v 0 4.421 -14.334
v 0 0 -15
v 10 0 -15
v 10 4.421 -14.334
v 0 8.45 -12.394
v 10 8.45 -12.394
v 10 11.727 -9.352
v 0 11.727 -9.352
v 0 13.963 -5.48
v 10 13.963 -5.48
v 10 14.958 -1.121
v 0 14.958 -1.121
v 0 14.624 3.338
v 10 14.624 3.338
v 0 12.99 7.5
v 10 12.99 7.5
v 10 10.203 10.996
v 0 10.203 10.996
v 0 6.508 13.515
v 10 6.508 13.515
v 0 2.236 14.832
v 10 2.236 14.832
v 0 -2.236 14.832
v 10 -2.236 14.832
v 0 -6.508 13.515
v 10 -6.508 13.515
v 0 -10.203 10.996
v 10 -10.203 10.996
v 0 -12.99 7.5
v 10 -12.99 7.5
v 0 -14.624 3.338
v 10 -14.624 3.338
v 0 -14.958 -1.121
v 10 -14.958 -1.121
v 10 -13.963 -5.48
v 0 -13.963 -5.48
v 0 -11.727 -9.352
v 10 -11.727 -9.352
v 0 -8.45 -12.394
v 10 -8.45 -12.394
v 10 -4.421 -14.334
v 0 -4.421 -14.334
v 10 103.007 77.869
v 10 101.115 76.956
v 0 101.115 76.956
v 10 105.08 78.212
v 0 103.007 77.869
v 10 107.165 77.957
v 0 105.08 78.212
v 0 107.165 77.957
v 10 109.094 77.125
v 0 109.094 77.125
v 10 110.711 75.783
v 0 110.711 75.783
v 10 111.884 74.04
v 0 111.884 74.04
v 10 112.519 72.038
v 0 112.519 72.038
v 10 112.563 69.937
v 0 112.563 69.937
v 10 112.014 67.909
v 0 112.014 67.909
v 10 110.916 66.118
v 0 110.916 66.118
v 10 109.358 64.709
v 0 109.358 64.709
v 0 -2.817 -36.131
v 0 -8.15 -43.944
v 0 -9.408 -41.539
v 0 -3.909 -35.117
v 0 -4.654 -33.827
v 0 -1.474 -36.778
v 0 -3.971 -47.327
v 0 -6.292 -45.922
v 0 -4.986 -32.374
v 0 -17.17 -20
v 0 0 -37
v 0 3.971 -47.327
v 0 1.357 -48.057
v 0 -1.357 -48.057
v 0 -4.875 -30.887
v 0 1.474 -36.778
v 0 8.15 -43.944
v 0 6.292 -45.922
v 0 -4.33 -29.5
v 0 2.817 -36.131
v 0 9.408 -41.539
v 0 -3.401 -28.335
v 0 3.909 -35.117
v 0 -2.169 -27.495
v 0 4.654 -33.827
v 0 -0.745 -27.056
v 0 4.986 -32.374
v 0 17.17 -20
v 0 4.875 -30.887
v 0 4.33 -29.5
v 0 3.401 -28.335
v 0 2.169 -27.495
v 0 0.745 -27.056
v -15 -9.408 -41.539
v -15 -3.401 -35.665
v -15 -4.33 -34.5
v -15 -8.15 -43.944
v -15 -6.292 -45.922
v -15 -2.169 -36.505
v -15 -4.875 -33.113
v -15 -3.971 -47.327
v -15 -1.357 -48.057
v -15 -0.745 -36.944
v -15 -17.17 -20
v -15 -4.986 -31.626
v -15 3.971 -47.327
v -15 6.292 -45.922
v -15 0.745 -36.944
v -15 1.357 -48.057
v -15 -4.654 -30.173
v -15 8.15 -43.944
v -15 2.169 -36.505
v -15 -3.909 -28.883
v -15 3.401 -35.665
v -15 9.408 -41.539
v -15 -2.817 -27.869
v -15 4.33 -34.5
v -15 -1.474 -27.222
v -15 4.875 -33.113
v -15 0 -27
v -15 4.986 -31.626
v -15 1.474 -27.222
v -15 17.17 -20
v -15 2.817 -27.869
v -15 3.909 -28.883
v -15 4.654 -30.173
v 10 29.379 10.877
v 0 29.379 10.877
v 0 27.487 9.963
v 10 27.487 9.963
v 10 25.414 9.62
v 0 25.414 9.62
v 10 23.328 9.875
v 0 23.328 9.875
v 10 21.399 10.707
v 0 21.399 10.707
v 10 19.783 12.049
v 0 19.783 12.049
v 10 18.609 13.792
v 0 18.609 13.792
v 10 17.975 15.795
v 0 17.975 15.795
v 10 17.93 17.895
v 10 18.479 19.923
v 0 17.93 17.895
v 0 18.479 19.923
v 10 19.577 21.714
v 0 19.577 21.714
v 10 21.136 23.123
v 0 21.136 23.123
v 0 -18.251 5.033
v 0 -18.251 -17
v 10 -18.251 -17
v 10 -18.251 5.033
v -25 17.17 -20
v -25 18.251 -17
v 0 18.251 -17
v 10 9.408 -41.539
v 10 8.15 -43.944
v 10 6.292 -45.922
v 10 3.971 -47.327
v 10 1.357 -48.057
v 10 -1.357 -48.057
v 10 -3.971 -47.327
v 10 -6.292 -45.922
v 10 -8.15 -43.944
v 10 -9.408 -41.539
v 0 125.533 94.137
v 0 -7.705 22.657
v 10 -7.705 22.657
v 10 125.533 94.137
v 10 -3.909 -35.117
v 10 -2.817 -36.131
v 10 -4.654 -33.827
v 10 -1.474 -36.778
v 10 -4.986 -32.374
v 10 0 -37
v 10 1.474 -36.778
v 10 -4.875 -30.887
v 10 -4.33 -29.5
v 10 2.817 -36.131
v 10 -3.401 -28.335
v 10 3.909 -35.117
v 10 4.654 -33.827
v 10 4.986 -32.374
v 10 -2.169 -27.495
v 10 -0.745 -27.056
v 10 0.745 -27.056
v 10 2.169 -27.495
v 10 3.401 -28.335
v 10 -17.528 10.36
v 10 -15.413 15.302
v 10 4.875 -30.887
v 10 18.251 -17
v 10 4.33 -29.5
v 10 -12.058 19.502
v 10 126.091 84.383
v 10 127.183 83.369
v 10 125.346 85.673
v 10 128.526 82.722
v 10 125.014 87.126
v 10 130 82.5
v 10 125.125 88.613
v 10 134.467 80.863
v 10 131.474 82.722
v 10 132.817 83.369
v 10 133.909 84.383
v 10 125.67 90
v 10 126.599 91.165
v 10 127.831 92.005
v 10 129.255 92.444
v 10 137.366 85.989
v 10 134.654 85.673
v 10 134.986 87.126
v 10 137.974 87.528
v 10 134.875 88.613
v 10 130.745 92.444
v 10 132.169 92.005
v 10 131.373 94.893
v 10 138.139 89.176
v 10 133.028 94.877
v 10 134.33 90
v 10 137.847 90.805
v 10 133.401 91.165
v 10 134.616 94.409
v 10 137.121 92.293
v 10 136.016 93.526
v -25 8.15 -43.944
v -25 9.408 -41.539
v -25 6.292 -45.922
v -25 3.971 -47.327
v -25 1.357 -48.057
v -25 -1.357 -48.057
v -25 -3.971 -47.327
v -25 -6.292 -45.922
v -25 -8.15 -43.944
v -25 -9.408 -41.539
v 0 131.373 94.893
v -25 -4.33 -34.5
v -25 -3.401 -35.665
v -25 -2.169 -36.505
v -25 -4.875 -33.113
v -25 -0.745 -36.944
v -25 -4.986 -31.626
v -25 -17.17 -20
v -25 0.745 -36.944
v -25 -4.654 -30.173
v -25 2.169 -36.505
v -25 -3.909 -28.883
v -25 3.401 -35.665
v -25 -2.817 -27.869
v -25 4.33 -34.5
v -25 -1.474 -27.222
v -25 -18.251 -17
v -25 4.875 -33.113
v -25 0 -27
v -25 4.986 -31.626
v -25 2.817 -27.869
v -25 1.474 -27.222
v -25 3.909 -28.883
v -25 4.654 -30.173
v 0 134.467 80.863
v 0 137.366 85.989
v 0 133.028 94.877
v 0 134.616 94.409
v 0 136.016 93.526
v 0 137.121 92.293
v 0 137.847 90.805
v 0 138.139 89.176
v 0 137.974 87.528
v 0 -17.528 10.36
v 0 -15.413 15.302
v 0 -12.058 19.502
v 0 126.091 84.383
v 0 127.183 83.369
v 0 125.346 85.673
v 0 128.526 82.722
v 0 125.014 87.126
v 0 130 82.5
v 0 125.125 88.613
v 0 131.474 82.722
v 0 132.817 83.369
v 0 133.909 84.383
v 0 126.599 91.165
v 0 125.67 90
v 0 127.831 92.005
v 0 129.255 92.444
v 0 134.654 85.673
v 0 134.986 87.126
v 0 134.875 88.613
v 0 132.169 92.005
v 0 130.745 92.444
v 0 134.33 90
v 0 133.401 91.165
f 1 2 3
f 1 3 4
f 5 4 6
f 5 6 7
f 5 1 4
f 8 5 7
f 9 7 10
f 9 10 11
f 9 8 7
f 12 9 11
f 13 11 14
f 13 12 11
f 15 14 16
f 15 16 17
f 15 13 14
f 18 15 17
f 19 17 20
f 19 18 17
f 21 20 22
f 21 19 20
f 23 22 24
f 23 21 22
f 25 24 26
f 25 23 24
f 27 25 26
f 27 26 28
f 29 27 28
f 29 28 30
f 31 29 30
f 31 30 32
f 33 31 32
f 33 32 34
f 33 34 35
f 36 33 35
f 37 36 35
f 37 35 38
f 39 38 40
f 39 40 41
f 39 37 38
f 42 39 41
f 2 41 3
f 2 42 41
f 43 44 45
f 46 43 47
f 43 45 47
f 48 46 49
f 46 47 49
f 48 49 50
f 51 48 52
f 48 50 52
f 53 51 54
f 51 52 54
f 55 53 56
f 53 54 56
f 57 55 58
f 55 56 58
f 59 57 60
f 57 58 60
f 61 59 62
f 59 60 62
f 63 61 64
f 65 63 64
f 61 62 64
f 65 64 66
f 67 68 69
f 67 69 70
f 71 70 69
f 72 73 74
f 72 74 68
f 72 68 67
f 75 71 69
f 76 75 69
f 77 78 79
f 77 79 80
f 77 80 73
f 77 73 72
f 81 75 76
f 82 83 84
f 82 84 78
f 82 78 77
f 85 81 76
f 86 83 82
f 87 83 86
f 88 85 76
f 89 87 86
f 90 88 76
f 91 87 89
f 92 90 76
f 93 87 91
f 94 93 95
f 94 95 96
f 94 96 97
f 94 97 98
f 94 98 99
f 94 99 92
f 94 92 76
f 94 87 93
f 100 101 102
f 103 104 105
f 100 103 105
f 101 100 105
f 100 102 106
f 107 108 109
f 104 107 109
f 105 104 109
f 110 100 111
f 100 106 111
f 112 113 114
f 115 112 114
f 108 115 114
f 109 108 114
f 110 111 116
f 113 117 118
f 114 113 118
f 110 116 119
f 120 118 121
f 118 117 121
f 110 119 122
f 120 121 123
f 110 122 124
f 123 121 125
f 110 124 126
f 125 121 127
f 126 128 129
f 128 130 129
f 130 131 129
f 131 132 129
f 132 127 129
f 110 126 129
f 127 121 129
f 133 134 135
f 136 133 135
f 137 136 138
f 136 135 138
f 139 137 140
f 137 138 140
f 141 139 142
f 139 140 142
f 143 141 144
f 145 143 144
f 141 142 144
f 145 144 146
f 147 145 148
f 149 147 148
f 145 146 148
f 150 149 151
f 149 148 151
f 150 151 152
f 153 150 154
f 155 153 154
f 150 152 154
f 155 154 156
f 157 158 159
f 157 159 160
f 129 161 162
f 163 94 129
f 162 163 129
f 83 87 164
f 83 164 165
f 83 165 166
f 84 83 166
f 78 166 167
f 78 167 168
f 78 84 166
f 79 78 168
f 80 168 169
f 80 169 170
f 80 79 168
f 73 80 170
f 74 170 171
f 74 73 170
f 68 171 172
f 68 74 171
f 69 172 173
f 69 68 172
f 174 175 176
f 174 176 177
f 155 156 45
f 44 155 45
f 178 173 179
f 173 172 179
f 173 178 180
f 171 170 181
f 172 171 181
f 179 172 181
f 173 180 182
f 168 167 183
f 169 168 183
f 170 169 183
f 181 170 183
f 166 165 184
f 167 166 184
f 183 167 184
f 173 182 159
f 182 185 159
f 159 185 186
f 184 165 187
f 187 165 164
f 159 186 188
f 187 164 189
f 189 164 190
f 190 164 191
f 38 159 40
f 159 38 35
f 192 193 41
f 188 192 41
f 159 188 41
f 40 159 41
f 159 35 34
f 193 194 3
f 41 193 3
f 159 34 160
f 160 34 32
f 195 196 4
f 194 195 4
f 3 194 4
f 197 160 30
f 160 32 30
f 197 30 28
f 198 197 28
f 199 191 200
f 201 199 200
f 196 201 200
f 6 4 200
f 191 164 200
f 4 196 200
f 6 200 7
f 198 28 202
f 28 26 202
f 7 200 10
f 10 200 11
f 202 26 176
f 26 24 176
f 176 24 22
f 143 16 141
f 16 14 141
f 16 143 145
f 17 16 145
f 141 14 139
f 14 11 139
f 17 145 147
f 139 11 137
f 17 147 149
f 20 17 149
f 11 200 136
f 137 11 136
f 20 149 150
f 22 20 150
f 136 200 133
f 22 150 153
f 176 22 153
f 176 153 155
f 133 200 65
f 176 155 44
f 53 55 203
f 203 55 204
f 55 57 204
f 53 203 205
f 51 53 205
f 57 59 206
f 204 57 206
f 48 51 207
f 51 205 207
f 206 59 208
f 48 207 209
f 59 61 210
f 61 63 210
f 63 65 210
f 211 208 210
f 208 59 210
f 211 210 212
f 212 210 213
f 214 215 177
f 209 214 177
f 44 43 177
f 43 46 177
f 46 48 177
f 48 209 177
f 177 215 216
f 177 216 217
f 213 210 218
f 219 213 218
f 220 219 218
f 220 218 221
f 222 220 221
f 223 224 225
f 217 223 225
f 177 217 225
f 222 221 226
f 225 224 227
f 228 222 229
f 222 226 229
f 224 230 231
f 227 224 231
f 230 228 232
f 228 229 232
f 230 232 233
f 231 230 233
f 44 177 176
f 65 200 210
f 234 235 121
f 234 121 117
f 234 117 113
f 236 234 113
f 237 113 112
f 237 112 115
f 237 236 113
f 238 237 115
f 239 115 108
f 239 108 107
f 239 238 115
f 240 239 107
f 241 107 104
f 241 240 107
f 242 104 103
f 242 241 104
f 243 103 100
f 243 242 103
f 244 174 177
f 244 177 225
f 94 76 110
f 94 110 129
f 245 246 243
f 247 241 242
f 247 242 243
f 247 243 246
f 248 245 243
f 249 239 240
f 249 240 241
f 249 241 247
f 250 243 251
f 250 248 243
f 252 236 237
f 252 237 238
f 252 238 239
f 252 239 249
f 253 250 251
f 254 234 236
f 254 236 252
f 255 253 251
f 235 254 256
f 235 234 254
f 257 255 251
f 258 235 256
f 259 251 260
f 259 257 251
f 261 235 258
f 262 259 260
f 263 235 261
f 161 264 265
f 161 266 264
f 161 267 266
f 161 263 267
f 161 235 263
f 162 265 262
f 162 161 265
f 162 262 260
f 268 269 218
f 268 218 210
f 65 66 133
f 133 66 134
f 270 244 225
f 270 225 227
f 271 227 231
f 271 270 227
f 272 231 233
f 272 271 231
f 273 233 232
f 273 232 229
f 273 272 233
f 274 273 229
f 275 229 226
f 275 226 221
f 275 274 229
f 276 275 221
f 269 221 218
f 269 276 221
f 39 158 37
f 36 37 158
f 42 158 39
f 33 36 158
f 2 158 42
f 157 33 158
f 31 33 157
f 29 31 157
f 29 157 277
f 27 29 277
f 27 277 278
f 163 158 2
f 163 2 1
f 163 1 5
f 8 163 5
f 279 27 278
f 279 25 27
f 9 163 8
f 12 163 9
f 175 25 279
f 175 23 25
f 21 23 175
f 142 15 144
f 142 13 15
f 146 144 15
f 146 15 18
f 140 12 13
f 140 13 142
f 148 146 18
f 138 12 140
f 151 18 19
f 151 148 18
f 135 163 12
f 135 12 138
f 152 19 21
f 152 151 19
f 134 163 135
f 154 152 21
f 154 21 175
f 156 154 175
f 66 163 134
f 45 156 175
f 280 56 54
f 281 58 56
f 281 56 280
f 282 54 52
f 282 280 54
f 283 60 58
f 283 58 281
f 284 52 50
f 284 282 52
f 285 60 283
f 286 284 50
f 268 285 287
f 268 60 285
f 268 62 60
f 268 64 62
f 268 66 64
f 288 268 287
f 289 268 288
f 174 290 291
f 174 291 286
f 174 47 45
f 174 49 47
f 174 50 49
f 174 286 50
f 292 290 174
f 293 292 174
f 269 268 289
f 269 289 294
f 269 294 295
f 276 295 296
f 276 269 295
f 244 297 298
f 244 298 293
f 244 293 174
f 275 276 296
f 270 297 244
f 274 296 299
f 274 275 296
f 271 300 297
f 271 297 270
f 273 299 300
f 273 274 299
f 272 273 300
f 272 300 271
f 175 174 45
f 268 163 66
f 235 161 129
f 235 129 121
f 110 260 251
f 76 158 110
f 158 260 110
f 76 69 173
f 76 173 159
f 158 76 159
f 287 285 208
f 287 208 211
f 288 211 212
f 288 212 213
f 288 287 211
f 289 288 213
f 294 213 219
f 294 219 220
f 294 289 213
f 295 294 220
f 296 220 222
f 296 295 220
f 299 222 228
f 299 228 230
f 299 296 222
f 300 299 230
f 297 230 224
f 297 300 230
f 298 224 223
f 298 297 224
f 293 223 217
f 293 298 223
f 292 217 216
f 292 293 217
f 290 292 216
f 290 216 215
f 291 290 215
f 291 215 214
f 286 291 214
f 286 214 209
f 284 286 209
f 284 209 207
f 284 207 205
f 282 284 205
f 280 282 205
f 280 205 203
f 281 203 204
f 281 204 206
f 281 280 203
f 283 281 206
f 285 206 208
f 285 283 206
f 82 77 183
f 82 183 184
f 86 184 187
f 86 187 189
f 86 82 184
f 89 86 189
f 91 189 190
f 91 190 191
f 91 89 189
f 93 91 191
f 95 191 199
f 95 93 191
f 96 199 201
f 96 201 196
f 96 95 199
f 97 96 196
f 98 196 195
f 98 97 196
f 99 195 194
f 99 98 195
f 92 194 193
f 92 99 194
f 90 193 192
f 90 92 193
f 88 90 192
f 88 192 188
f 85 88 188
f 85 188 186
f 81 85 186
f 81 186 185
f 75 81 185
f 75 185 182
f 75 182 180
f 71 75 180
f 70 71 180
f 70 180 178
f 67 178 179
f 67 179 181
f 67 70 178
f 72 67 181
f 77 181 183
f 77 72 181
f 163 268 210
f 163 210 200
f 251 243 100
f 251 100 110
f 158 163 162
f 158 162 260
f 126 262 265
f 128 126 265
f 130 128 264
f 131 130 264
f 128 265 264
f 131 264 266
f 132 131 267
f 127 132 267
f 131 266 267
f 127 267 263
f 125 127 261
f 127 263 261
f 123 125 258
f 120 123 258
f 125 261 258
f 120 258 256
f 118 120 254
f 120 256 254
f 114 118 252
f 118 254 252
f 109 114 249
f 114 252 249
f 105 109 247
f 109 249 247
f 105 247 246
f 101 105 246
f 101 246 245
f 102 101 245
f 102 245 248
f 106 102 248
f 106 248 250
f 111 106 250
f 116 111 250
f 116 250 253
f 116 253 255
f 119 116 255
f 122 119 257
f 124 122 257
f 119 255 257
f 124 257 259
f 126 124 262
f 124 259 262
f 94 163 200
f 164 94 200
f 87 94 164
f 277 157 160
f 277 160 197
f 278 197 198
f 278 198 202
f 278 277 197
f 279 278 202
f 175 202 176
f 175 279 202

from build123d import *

# Parameters (mm, degrees)
SKETCH_1_R      = 15
SKETCH_1_R_2    = 5
EXTRUDE_1_DEPTH = 10
EXTRUDE_2_DEPTH = 25
EXTRUDE_START   = 25
SKETCH_4_R      = 5
EXTRUDE_3_DEPTH = 10


with BuildPart() as part:
    # 草图1 → 凸台-拉伸1 (new body)
    with BuildSketch(Plane(origin=(0, 0, 0), x_dir=(0, 0, -1), z_dir=(1, 0, 0))):
        with BuildLine():
            Line((17, -18.250593409), (-5.033226664, -18.250593409))
            ThreePointArc((-5.033226664, -18.250593409), (-15.302169006, -15.413018156), (-22.657221681, -7.705475727))
            Line((-22.657221681, -7.705475727), (-94.136701981, 125.532989051))
            Line((-94.136701981, 125.532989051), (-94.892932848, 131.372771855))
            ThreePointArc((-94.892932848, 131.372771855), (-92.292875006, 137.120842866), (-85.988862782, 137.365895938))
            Line((-85.988862782, 137.365895938), (-80.863298019, 134.467010949))
            Line((-80.863298019, 134.467010949), (17, 18.250593409))
            Line((17, 18.250593409), (41.539406806, 9.407825134))
            ThreePointArc((41.539406806, 9.407825134), (48.14929969, 0), (41.539406806, -9.407825134))
            Line((41.539406806, -9.407825134), (17, -18.250593409))
        make_face()
        Circle(SKETCH_1_R, mode=Mode.SUBTRACT)
        with Locations((-87.5, 130)):
            Circle(SKETCH_1_R_2, mode=Mode.SUBTRACT)
        with Locations((32, 0)):
            Circle(SKETCH_1_R_2, mode=Mode.SUBTRACT)
        with BuildLine():
            Line((-64.708700169, 109.357968665), (-10.87651369, 29.378720182))
            ThreePointArc((-10.87651369, 29.378720182), (-12.878422676, 19.133656547), (-23.12348631, 21.135565533))
            Line((-23.12348631, 21.135565533), (-76.95567279, 101.114814016))
            ThreePointArc((-76.95567279, 101.114814016), (-74.953763803, 111.359877651), (-64.708700169, 109.357968665))
        make_face(mode=Mode.SUBTRACT)
    extrude(amount=EXTRUDE_1_DEPTH)

    # 草图2 → 凸台-拉伸2 (add)
    with BuildSketch(Plane(origin=(0, 0, 0), x_dir=(0, 0, -1), z_dir=(1, 0, 0))):
        Polygon((17, 18.250593409), (17, -18.250593409), (20, -17.169544261), (20, 17.169544261), align=None)
    extrude(amount=-EXTRUDE_2_DEPTH)

    # 草图4 → 凸台-拉伸3 (add)
    with BuildSketch(Plane.ZY.offset(EXTRUDE_START)):
        with BuildLine():
            ThreePointArc((-41.539406806, 9.407825134), (-48.14929969, 0), (-41.539406806, -9.407825134))
            Line((-41.539406806, -9.407825134), (-20, -17.169544261))
            Line((-20, -17.169544261), (-20, 17.169544261))
            Line((-20, 17.169544261), (-41.539406806, 9.407825134))
        make_face()
        with Locations((-32, 0)):
            Circle(SKETCH_4_R, mode=Mode.SUBTRACT)
    extrude(amount=-EXTRUDE_3_DEPTH)


solid = part.part
